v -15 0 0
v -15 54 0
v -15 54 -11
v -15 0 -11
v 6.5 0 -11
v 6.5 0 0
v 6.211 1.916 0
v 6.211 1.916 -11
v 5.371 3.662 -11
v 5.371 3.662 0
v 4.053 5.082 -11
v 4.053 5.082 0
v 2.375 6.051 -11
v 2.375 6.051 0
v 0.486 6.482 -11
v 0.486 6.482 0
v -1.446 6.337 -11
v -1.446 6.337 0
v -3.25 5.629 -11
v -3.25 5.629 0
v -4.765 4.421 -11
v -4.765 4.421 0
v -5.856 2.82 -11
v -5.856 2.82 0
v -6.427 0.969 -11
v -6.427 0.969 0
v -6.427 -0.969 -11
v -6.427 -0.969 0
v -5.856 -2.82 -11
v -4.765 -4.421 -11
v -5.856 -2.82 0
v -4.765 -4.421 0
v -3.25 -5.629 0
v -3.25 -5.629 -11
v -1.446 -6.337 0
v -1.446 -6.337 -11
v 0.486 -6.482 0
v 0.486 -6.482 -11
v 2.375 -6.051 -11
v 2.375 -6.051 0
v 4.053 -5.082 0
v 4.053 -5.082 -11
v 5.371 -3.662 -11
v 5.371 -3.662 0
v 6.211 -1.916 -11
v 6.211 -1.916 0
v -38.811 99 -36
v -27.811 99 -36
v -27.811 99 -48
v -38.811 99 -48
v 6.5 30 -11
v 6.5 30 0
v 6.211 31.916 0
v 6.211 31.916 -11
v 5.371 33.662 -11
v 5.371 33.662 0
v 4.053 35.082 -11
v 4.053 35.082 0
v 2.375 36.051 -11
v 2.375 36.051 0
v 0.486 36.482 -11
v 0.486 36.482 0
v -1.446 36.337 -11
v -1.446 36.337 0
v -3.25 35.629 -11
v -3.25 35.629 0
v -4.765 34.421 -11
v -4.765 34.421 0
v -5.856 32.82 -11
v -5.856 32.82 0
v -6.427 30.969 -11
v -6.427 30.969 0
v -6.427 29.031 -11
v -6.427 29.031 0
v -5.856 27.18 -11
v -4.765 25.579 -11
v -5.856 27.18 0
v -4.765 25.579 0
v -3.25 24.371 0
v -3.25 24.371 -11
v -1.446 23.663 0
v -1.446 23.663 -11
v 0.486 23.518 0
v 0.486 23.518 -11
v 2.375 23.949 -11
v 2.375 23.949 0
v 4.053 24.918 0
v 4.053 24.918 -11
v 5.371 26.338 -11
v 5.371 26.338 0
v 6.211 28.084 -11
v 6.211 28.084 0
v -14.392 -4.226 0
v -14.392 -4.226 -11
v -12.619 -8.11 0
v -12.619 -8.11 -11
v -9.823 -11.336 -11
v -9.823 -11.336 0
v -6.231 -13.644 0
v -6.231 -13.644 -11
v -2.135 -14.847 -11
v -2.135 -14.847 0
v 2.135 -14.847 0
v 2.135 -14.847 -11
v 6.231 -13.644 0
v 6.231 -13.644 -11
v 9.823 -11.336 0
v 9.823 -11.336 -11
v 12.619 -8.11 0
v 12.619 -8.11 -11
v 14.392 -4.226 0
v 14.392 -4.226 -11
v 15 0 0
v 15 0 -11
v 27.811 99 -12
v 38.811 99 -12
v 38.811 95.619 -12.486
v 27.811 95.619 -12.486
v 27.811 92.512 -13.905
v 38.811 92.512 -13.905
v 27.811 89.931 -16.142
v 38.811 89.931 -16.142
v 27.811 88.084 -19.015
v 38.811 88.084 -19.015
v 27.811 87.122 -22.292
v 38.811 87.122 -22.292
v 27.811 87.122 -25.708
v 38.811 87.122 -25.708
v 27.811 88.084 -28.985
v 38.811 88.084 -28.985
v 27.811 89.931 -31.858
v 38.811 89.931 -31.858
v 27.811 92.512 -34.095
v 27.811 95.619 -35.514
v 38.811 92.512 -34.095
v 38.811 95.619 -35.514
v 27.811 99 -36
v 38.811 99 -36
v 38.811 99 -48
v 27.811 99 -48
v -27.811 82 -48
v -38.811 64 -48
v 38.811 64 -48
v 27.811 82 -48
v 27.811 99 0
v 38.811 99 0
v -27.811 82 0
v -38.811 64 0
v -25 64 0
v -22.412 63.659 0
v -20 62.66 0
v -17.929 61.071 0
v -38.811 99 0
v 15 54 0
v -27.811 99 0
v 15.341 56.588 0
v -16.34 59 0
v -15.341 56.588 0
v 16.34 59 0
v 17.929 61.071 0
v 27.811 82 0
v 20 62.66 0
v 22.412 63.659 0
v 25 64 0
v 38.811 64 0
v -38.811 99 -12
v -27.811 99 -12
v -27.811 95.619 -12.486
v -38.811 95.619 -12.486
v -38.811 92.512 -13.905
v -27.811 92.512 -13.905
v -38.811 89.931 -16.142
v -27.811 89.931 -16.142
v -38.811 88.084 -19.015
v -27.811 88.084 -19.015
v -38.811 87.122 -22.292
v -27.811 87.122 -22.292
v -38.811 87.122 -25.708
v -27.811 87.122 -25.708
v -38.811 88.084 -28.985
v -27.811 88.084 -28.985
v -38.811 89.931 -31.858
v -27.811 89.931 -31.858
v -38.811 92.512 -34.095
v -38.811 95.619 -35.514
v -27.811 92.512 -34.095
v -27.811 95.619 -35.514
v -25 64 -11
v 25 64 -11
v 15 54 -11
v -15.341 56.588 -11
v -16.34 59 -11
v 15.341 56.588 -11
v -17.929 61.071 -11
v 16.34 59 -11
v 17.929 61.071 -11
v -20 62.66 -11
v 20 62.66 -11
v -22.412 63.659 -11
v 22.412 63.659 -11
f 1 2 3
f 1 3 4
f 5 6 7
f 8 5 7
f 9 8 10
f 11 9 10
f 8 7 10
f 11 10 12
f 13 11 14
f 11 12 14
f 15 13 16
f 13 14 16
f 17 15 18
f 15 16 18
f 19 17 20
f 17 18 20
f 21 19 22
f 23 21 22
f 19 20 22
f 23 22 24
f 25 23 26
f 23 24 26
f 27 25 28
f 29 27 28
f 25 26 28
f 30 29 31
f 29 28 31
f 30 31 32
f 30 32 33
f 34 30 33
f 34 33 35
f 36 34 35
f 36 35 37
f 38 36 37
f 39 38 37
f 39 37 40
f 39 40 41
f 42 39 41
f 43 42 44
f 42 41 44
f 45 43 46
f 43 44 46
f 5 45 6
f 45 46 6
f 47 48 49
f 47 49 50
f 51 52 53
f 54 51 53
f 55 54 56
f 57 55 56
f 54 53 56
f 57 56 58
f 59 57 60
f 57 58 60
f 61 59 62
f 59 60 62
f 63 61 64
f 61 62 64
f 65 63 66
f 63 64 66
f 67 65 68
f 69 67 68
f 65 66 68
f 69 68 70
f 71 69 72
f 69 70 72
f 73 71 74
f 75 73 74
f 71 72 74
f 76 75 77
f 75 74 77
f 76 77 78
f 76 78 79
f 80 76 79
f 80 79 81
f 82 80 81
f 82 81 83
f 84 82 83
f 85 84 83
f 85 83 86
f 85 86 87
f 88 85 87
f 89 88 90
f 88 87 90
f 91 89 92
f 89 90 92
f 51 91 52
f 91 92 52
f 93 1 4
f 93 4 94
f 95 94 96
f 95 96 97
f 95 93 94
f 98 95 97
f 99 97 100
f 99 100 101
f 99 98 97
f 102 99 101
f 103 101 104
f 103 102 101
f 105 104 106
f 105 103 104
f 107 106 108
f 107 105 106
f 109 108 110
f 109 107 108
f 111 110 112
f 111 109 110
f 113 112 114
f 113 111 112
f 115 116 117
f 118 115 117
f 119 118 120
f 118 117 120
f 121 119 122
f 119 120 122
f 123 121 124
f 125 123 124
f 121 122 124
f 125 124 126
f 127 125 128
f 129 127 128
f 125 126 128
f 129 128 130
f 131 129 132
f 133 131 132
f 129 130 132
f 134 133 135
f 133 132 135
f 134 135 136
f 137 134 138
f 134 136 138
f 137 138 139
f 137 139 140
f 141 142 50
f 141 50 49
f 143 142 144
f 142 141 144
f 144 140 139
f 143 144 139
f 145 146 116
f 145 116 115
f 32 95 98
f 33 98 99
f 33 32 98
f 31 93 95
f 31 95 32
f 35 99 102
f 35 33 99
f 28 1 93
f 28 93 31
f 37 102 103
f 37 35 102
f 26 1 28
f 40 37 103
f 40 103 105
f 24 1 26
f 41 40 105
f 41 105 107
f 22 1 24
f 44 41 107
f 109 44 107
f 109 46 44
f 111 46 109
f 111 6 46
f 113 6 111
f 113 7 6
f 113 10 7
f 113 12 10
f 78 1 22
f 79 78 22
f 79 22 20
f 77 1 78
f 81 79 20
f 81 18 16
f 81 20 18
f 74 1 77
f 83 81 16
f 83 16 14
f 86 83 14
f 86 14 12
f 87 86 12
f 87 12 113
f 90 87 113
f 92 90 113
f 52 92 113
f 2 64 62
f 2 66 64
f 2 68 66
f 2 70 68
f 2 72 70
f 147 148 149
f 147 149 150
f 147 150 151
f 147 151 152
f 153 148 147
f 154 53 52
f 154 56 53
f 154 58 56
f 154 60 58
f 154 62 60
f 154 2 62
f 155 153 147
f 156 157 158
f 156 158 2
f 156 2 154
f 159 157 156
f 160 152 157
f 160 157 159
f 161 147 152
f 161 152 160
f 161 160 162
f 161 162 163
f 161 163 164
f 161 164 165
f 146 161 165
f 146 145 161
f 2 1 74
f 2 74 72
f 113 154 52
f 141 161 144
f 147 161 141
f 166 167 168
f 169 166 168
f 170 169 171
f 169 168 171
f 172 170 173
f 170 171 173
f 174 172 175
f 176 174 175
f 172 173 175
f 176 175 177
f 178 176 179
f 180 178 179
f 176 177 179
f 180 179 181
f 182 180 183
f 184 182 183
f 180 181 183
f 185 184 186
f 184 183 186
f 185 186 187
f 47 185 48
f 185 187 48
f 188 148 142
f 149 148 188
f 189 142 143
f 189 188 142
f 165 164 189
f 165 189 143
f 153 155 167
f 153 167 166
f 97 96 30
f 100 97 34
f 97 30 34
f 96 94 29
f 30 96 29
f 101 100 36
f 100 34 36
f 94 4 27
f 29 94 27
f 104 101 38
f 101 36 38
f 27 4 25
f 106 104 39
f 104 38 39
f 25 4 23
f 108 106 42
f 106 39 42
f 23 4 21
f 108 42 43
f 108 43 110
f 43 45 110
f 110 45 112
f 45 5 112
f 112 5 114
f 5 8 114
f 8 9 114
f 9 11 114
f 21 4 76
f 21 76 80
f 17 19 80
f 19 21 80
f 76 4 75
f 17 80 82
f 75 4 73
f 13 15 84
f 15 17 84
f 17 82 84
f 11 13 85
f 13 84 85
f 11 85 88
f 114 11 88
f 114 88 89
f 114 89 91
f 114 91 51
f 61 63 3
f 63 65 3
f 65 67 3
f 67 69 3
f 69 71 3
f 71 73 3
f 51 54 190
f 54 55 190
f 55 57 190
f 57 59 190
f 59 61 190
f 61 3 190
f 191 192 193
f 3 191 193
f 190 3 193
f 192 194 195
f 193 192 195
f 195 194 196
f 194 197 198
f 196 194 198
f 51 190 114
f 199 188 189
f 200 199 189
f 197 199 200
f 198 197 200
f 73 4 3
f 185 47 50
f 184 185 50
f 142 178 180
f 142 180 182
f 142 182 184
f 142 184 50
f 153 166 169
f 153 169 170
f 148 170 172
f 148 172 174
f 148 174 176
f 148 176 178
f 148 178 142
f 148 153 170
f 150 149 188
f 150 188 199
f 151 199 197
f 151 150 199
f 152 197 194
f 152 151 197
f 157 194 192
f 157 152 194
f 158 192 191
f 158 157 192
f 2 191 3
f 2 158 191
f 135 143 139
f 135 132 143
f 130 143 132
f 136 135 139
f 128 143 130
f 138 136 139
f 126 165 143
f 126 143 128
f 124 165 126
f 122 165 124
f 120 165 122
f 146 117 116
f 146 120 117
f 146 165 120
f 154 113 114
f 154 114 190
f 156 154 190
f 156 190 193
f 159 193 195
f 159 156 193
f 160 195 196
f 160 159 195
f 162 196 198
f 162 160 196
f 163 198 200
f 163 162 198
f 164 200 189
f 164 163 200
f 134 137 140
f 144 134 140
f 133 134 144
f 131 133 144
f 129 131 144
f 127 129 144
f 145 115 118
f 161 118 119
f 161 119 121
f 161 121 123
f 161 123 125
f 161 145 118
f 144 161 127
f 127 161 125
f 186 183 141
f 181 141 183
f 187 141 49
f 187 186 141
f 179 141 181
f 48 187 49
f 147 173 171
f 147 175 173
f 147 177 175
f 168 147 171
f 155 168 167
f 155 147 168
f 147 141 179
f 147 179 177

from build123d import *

# Parameters (mm, degrees)
SKETCH1_R           = 6.5
BOSS_EXTRUDE1_DEPTH = 11
BOSS_EXTRUDE2_DEPTH = 48
SKETCH2_R           = 12
CUT_EXTRUDE1_DEPTH  = 135.648061082


with BuildPart() as part:
    # Sketch1 → Boss-Extrude1 (new body)
    with BuildSketch(Plane.XY):
        with BuildLine():
            Line((25, 64), (-25, 64))
            ThreePointArc((-25, 64), (-17.928932188, 61.071067812), (-15, 54))
            Line((-15, 54), (-15, 0))
            ThreePointArc((-15, 0), (0, -15), (15, 0))
            Line((15, 0), (15, 54))
            ThreePointArc((15, 54), (17.928932188, 61.071067812), (25, 64))
        make_face()
        Circle(SKETCH1_R, mode=Mode.SUBTRACT)
        with Locations((0, 30)):
            Circle(SKETCH1_R, mode=Mode.SUBTRACT)
    extrude(amount=-BOSS_EXTRUDE1_DEPTH)

    # Sketch1<3> → Boss-Extrude2 (add)
    with BuildSketch(Plane.XY):
        Polygon((27.810759955, 82), (-27.810759955, 82), (-27.810759955, 99), (-38.810759955, 99), (-38.810759955, 64), (38.810759955, 64), (38.810759955, 99), (27.810759955, 99), align=None)
    extrude(amount=-BOSS_EXTRUDE2_DEPTH)

    # Sketch2 → Cut-Extrude1 (cut, through all)
    with BuildSketch(Plane(origin=(38.810759955, 0, 0), x_dir=(0, 0, -1), z_dir=(1, 0, 0))):
        with Locations((24, 99)):
            Circle(SKETCH2_R)
    extrude(amount=-CUT_EXTRUDE1_DEPTH, mode=Mode.SUBTRACT)


solid = part.part
